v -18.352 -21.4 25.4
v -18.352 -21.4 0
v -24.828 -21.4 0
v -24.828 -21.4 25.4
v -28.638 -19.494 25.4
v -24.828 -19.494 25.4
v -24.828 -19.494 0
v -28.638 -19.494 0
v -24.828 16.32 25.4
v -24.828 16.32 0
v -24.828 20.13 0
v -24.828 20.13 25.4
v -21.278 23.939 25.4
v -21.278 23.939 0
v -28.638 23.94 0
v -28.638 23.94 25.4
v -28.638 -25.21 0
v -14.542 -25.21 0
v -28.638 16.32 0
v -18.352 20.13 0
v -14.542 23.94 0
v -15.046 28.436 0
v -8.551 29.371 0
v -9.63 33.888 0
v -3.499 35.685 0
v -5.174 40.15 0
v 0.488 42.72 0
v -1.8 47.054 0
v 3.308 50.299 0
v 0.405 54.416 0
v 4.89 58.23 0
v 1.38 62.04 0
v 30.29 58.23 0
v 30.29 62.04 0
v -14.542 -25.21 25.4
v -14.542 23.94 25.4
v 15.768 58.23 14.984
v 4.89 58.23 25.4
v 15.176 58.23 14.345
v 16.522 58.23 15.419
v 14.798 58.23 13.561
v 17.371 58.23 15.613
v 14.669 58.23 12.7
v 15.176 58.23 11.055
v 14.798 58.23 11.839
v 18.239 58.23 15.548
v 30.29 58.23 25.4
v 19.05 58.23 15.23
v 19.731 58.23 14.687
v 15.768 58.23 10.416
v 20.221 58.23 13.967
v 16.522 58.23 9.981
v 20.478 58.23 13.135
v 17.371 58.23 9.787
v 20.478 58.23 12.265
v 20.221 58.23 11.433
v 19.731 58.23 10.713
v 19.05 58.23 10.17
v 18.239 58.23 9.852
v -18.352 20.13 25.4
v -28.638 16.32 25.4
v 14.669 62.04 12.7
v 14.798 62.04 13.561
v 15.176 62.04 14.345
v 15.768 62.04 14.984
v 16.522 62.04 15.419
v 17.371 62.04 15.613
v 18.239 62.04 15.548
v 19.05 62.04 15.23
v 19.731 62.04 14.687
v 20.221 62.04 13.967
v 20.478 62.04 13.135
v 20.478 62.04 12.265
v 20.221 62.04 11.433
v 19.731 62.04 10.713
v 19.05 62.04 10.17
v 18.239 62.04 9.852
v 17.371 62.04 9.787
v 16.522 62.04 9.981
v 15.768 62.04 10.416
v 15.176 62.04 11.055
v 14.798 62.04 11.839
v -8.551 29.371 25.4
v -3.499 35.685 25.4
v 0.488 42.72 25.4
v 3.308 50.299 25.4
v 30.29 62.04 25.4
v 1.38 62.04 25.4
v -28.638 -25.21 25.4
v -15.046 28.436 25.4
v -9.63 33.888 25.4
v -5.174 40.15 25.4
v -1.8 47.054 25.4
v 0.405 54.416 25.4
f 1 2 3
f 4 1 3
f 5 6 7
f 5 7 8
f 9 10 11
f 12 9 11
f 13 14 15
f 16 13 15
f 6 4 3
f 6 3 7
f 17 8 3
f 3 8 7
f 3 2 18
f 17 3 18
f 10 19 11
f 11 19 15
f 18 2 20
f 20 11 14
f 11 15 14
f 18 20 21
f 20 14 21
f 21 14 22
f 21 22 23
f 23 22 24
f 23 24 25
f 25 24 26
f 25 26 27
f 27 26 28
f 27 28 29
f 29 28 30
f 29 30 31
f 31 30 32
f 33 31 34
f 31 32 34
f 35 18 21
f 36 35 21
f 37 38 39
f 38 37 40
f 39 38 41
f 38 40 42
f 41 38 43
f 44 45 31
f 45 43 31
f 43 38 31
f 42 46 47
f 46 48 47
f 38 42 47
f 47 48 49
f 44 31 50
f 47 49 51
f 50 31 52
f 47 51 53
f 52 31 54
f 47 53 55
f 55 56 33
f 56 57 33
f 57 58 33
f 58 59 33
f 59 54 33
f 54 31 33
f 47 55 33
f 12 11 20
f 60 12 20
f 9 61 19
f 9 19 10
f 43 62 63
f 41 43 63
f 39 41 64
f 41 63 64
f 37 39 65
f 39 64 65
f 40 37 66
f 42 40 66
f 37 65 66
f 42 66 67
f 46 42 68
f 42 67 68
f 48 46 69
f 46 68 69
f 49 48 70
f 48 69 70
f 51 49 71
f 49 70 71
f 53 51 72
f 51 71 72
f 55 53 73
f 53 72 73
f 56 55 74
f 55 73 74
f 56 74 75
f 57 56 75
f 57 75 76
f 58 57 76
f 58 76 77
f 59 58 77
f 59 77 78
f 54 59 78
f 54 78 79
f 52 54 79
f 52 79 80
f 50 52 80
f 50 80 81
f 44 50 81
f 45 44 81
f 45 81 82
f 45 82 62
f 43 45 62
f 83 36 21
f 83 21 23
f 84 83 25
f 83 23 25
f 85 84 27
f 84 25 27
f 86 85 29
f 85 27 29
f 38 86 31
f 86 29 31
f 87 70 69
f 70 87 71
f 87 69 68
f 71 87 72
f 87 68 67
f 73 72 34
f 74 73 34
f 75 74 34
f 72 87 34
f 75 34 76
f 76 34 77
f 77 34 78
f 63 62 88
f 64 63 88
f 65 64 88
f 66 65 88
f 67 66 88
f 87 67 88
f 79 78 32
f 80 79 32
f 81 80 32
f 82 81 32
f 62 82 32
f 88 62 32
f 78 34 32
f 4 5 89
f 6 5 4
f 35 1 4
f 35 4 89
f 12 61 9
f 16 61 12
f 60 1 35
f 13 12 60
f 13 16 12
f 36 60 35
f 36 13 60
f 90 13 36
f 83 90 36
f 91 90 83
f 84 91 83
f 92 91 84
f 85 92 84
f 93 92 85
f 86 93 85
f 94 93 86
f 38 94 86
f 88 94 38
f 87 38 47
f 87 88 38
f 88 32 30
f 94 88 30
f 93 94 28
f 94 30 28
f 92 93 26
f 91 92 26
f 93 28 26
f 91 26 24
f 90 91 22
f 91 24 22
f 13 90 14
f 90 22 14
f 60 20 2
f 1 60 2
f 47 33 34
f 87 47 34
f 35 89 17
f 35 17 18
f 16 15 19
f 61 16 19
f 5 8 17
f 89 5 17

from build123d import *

# Parameters (mm, degrees)
F1_DEPTH = 25.4
F2_R     = 2.921
F3_DEPTH = 87.25


with BuildPart() as f1:
    # F0 (on Top) → F1 (new body)
    with BuildSketch(Plane.XY):
        with BuildLine():
            Line((-24.8285, 20.1295), (-18.3515, 20.1295))
            Line((-18.3515, 20.1295), (-18.3515, -21.3995))
            Line((-18.3515, -21.3995), (-24.8285, -21.3995))
            Line((-24.8285, -21.3995), (-24.8285, -19.4945))
            Line((-24.8285, -19.4945), (-28.6385, -19.4945))
            Line((-28.6385, -19.4945), (-28.6385, -25.2095))
            Line((-28.6385, -25.2095), (-14.5415, -25.2095))
            Line((-14.5415, -25.2095), (-14.5415, 20.1295))
            Line((-14.5415, 20.1295), (-14.5415, 23.9395))
            ThreePointArc((-14.5415, 23.9395), (-1.365036, 39.123287), (4.8895, 58.2295))
            Line((4.8895, 58.2295), (30.2895, 58.2295))
            Line((30.2895, 58.2295), (30.2895, 62.0395))
            Line((30.2895, 62.0395), (1.37959, 62.0395))
            ThreePointArc((1.37959, 62.0395), (-5.1744, 40.149819), (-21.27839, 23.9395))
            Line((-21.27839, 23.9395), (-28.6385, 23.9395))
            Line((-28.6385, 23.9395), (-28.6385, 16.3195))
            Line((-28.6385, 16.3195), (-24.8285, 16.3195))
            Line((-24.8285, 16.3195), (-24.8285, 20.1295))
        make_face()
    extrude(amount=F1_DEPTH)

    # F2 (on face) → F3 (cut, through all)
    with BuildSketch(Plane(origin=(0, 62.0395, 0), x_dir=(-1, 0, 0), z_dir=(0, 1, 0))):
        with Locations((-17.5895, 12.7)):
            Circle(F2_R)
    extrude(amount=-F3_DEPTH, mode=Mode.SUBTRACT)


solid = f1.part
